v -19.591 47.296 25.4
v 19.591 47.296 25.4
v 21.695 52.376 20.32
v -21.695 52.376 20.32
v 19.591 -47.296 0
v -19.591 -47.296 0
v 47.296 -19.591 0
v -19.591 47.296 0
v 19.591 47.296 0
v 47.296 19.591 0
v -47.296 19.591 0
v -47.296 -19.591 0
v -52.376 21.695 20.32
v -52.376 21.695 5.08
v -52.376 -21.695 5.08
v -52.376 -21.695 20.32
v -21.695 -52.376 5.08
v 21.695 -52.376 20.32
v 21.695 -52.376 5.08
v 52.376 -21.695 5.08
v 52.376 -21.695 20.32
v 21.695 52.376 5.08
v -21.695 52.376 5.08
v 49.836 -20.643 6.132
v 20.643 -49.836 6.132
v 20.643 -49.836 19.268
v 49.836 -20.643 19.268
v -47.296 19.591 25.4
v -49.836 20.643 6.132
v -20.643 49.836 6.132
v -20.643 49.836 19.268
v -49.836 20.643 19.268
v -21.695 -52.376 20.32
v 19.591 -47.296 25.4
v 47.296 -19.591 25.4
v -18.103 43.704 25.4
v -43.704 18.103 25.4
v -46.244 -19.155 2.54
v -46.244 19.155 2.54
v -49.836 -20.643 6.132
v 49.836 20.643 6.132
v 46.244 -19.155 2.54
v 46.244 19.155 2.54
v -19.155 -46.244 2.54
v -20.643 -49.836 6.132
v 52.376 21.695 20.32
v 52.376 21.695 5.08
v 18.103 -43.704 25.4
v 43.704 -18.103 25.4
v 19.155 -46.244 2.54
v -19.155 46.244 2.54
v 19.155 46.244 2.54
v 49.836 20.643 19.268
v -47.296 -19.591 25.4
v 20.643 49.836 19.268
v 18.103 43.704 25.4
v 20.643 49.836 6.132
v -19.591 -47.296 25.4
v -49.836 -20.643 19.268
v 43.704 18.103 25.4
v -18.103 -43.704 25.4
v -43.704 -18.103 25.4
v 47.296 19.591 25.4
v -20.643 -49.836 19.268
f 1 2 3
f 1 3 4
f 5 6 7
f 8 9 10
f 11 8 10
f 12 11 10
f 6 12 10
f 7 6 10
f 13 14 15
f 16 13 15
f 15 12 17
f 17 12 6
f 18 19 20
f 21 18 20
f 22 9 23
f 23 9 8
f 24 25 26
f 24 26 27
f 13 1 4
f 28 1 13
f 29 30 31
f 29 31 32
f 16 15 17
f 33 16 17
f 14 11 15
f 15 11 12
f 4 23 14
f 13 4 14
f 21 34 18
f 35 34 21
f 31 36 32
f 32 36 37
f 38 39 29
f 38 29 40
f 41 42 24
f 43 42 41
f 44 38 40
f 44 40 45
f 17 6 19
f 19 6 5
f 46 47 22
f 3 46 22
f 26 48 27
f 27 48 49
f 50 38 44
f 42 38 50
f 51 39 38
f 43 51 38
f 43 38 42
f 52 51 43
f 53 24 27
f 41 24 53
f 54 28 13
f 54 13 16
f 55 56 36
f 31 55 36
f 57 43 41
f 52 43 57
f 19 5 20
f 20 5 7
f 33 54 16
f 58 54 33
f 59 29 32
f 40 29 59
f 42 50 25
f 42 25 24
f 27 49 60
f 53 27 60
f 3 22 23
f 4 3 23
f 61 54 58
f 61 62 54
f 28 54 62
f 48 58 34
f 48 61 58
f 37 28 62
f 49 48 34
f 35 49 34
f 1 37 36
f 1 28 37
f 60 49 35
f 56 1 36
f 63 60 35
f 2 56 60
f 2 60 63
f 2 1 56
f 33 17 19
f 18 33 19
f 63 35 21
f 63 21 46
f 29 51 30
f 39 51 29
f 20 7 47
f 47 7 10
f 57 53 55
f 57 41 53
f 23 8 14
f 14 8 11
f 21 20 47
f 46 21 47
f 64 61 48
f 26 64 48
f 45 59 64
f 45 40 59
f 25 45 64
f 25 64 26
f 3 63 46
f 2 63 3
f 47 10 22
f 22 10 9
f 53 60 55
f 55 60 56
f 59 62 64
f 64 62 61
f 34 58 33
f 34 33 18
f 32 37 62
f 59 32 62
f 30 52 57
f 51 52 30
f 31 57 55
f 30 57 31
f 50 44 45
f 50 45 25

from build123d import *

# Parameters (mm, degrees)
F1_DEPTH = 25.4
F2_SIZE  = 5.08
F3_T     = -2.54


with BuildPart() as f1:
    # F0 (on Top) → F1 (new body)
    with BuildSketch(Plane.XY):
        Polygon((52.375846, -21.694786), (52.375846, 21.694786), (21.694786, 52.375846), (-21.694786, 52.375846), (-52.375846, 21.694786), (-52.375846, -21.694786), (-21.694786, -52.375846), (21.694786, -52.375846), align=None)
    extrude(amount=F1_DEPTH)

    # F2
    f2_edges = [f1.edges().sort_by_distance(p)[0] for p in [
        (37.035316, -37.035316, 25.4),
        (52.375846, 0, 25.4),
        (37.035316, 37.035316, 25.4),
        (0, 52.375846, 25.4),
        (-37.035316, 37.035316, 25.4),
        (-52.375846, 0, 25.4),
        (-37.035316, -37.035316, 25.4),
        (0, -52.375846, 25.4),
        (37.035316, -37.035316, 0),
        (52.375846, 0, 0),
        (37.035316, 37.035316, 0),
        (0, 52.375846, 0),
        (-37.035316, 37.035316, 0),
        (-52.375846, 0, 0),
        (-37.035316, -37.035316, 0),
        (0, -52.375846, 0),
    ]]
    chamfer(f2_edges, length=F2_SIZE)

    # F3
    f3_openings = [f1.faces().sort_by_distance(p)[0] for p in [
        (0, 0, 25.4),
    ]]
    offset(amount=F3_T, openings=f3_openings)


solid = f1.part
